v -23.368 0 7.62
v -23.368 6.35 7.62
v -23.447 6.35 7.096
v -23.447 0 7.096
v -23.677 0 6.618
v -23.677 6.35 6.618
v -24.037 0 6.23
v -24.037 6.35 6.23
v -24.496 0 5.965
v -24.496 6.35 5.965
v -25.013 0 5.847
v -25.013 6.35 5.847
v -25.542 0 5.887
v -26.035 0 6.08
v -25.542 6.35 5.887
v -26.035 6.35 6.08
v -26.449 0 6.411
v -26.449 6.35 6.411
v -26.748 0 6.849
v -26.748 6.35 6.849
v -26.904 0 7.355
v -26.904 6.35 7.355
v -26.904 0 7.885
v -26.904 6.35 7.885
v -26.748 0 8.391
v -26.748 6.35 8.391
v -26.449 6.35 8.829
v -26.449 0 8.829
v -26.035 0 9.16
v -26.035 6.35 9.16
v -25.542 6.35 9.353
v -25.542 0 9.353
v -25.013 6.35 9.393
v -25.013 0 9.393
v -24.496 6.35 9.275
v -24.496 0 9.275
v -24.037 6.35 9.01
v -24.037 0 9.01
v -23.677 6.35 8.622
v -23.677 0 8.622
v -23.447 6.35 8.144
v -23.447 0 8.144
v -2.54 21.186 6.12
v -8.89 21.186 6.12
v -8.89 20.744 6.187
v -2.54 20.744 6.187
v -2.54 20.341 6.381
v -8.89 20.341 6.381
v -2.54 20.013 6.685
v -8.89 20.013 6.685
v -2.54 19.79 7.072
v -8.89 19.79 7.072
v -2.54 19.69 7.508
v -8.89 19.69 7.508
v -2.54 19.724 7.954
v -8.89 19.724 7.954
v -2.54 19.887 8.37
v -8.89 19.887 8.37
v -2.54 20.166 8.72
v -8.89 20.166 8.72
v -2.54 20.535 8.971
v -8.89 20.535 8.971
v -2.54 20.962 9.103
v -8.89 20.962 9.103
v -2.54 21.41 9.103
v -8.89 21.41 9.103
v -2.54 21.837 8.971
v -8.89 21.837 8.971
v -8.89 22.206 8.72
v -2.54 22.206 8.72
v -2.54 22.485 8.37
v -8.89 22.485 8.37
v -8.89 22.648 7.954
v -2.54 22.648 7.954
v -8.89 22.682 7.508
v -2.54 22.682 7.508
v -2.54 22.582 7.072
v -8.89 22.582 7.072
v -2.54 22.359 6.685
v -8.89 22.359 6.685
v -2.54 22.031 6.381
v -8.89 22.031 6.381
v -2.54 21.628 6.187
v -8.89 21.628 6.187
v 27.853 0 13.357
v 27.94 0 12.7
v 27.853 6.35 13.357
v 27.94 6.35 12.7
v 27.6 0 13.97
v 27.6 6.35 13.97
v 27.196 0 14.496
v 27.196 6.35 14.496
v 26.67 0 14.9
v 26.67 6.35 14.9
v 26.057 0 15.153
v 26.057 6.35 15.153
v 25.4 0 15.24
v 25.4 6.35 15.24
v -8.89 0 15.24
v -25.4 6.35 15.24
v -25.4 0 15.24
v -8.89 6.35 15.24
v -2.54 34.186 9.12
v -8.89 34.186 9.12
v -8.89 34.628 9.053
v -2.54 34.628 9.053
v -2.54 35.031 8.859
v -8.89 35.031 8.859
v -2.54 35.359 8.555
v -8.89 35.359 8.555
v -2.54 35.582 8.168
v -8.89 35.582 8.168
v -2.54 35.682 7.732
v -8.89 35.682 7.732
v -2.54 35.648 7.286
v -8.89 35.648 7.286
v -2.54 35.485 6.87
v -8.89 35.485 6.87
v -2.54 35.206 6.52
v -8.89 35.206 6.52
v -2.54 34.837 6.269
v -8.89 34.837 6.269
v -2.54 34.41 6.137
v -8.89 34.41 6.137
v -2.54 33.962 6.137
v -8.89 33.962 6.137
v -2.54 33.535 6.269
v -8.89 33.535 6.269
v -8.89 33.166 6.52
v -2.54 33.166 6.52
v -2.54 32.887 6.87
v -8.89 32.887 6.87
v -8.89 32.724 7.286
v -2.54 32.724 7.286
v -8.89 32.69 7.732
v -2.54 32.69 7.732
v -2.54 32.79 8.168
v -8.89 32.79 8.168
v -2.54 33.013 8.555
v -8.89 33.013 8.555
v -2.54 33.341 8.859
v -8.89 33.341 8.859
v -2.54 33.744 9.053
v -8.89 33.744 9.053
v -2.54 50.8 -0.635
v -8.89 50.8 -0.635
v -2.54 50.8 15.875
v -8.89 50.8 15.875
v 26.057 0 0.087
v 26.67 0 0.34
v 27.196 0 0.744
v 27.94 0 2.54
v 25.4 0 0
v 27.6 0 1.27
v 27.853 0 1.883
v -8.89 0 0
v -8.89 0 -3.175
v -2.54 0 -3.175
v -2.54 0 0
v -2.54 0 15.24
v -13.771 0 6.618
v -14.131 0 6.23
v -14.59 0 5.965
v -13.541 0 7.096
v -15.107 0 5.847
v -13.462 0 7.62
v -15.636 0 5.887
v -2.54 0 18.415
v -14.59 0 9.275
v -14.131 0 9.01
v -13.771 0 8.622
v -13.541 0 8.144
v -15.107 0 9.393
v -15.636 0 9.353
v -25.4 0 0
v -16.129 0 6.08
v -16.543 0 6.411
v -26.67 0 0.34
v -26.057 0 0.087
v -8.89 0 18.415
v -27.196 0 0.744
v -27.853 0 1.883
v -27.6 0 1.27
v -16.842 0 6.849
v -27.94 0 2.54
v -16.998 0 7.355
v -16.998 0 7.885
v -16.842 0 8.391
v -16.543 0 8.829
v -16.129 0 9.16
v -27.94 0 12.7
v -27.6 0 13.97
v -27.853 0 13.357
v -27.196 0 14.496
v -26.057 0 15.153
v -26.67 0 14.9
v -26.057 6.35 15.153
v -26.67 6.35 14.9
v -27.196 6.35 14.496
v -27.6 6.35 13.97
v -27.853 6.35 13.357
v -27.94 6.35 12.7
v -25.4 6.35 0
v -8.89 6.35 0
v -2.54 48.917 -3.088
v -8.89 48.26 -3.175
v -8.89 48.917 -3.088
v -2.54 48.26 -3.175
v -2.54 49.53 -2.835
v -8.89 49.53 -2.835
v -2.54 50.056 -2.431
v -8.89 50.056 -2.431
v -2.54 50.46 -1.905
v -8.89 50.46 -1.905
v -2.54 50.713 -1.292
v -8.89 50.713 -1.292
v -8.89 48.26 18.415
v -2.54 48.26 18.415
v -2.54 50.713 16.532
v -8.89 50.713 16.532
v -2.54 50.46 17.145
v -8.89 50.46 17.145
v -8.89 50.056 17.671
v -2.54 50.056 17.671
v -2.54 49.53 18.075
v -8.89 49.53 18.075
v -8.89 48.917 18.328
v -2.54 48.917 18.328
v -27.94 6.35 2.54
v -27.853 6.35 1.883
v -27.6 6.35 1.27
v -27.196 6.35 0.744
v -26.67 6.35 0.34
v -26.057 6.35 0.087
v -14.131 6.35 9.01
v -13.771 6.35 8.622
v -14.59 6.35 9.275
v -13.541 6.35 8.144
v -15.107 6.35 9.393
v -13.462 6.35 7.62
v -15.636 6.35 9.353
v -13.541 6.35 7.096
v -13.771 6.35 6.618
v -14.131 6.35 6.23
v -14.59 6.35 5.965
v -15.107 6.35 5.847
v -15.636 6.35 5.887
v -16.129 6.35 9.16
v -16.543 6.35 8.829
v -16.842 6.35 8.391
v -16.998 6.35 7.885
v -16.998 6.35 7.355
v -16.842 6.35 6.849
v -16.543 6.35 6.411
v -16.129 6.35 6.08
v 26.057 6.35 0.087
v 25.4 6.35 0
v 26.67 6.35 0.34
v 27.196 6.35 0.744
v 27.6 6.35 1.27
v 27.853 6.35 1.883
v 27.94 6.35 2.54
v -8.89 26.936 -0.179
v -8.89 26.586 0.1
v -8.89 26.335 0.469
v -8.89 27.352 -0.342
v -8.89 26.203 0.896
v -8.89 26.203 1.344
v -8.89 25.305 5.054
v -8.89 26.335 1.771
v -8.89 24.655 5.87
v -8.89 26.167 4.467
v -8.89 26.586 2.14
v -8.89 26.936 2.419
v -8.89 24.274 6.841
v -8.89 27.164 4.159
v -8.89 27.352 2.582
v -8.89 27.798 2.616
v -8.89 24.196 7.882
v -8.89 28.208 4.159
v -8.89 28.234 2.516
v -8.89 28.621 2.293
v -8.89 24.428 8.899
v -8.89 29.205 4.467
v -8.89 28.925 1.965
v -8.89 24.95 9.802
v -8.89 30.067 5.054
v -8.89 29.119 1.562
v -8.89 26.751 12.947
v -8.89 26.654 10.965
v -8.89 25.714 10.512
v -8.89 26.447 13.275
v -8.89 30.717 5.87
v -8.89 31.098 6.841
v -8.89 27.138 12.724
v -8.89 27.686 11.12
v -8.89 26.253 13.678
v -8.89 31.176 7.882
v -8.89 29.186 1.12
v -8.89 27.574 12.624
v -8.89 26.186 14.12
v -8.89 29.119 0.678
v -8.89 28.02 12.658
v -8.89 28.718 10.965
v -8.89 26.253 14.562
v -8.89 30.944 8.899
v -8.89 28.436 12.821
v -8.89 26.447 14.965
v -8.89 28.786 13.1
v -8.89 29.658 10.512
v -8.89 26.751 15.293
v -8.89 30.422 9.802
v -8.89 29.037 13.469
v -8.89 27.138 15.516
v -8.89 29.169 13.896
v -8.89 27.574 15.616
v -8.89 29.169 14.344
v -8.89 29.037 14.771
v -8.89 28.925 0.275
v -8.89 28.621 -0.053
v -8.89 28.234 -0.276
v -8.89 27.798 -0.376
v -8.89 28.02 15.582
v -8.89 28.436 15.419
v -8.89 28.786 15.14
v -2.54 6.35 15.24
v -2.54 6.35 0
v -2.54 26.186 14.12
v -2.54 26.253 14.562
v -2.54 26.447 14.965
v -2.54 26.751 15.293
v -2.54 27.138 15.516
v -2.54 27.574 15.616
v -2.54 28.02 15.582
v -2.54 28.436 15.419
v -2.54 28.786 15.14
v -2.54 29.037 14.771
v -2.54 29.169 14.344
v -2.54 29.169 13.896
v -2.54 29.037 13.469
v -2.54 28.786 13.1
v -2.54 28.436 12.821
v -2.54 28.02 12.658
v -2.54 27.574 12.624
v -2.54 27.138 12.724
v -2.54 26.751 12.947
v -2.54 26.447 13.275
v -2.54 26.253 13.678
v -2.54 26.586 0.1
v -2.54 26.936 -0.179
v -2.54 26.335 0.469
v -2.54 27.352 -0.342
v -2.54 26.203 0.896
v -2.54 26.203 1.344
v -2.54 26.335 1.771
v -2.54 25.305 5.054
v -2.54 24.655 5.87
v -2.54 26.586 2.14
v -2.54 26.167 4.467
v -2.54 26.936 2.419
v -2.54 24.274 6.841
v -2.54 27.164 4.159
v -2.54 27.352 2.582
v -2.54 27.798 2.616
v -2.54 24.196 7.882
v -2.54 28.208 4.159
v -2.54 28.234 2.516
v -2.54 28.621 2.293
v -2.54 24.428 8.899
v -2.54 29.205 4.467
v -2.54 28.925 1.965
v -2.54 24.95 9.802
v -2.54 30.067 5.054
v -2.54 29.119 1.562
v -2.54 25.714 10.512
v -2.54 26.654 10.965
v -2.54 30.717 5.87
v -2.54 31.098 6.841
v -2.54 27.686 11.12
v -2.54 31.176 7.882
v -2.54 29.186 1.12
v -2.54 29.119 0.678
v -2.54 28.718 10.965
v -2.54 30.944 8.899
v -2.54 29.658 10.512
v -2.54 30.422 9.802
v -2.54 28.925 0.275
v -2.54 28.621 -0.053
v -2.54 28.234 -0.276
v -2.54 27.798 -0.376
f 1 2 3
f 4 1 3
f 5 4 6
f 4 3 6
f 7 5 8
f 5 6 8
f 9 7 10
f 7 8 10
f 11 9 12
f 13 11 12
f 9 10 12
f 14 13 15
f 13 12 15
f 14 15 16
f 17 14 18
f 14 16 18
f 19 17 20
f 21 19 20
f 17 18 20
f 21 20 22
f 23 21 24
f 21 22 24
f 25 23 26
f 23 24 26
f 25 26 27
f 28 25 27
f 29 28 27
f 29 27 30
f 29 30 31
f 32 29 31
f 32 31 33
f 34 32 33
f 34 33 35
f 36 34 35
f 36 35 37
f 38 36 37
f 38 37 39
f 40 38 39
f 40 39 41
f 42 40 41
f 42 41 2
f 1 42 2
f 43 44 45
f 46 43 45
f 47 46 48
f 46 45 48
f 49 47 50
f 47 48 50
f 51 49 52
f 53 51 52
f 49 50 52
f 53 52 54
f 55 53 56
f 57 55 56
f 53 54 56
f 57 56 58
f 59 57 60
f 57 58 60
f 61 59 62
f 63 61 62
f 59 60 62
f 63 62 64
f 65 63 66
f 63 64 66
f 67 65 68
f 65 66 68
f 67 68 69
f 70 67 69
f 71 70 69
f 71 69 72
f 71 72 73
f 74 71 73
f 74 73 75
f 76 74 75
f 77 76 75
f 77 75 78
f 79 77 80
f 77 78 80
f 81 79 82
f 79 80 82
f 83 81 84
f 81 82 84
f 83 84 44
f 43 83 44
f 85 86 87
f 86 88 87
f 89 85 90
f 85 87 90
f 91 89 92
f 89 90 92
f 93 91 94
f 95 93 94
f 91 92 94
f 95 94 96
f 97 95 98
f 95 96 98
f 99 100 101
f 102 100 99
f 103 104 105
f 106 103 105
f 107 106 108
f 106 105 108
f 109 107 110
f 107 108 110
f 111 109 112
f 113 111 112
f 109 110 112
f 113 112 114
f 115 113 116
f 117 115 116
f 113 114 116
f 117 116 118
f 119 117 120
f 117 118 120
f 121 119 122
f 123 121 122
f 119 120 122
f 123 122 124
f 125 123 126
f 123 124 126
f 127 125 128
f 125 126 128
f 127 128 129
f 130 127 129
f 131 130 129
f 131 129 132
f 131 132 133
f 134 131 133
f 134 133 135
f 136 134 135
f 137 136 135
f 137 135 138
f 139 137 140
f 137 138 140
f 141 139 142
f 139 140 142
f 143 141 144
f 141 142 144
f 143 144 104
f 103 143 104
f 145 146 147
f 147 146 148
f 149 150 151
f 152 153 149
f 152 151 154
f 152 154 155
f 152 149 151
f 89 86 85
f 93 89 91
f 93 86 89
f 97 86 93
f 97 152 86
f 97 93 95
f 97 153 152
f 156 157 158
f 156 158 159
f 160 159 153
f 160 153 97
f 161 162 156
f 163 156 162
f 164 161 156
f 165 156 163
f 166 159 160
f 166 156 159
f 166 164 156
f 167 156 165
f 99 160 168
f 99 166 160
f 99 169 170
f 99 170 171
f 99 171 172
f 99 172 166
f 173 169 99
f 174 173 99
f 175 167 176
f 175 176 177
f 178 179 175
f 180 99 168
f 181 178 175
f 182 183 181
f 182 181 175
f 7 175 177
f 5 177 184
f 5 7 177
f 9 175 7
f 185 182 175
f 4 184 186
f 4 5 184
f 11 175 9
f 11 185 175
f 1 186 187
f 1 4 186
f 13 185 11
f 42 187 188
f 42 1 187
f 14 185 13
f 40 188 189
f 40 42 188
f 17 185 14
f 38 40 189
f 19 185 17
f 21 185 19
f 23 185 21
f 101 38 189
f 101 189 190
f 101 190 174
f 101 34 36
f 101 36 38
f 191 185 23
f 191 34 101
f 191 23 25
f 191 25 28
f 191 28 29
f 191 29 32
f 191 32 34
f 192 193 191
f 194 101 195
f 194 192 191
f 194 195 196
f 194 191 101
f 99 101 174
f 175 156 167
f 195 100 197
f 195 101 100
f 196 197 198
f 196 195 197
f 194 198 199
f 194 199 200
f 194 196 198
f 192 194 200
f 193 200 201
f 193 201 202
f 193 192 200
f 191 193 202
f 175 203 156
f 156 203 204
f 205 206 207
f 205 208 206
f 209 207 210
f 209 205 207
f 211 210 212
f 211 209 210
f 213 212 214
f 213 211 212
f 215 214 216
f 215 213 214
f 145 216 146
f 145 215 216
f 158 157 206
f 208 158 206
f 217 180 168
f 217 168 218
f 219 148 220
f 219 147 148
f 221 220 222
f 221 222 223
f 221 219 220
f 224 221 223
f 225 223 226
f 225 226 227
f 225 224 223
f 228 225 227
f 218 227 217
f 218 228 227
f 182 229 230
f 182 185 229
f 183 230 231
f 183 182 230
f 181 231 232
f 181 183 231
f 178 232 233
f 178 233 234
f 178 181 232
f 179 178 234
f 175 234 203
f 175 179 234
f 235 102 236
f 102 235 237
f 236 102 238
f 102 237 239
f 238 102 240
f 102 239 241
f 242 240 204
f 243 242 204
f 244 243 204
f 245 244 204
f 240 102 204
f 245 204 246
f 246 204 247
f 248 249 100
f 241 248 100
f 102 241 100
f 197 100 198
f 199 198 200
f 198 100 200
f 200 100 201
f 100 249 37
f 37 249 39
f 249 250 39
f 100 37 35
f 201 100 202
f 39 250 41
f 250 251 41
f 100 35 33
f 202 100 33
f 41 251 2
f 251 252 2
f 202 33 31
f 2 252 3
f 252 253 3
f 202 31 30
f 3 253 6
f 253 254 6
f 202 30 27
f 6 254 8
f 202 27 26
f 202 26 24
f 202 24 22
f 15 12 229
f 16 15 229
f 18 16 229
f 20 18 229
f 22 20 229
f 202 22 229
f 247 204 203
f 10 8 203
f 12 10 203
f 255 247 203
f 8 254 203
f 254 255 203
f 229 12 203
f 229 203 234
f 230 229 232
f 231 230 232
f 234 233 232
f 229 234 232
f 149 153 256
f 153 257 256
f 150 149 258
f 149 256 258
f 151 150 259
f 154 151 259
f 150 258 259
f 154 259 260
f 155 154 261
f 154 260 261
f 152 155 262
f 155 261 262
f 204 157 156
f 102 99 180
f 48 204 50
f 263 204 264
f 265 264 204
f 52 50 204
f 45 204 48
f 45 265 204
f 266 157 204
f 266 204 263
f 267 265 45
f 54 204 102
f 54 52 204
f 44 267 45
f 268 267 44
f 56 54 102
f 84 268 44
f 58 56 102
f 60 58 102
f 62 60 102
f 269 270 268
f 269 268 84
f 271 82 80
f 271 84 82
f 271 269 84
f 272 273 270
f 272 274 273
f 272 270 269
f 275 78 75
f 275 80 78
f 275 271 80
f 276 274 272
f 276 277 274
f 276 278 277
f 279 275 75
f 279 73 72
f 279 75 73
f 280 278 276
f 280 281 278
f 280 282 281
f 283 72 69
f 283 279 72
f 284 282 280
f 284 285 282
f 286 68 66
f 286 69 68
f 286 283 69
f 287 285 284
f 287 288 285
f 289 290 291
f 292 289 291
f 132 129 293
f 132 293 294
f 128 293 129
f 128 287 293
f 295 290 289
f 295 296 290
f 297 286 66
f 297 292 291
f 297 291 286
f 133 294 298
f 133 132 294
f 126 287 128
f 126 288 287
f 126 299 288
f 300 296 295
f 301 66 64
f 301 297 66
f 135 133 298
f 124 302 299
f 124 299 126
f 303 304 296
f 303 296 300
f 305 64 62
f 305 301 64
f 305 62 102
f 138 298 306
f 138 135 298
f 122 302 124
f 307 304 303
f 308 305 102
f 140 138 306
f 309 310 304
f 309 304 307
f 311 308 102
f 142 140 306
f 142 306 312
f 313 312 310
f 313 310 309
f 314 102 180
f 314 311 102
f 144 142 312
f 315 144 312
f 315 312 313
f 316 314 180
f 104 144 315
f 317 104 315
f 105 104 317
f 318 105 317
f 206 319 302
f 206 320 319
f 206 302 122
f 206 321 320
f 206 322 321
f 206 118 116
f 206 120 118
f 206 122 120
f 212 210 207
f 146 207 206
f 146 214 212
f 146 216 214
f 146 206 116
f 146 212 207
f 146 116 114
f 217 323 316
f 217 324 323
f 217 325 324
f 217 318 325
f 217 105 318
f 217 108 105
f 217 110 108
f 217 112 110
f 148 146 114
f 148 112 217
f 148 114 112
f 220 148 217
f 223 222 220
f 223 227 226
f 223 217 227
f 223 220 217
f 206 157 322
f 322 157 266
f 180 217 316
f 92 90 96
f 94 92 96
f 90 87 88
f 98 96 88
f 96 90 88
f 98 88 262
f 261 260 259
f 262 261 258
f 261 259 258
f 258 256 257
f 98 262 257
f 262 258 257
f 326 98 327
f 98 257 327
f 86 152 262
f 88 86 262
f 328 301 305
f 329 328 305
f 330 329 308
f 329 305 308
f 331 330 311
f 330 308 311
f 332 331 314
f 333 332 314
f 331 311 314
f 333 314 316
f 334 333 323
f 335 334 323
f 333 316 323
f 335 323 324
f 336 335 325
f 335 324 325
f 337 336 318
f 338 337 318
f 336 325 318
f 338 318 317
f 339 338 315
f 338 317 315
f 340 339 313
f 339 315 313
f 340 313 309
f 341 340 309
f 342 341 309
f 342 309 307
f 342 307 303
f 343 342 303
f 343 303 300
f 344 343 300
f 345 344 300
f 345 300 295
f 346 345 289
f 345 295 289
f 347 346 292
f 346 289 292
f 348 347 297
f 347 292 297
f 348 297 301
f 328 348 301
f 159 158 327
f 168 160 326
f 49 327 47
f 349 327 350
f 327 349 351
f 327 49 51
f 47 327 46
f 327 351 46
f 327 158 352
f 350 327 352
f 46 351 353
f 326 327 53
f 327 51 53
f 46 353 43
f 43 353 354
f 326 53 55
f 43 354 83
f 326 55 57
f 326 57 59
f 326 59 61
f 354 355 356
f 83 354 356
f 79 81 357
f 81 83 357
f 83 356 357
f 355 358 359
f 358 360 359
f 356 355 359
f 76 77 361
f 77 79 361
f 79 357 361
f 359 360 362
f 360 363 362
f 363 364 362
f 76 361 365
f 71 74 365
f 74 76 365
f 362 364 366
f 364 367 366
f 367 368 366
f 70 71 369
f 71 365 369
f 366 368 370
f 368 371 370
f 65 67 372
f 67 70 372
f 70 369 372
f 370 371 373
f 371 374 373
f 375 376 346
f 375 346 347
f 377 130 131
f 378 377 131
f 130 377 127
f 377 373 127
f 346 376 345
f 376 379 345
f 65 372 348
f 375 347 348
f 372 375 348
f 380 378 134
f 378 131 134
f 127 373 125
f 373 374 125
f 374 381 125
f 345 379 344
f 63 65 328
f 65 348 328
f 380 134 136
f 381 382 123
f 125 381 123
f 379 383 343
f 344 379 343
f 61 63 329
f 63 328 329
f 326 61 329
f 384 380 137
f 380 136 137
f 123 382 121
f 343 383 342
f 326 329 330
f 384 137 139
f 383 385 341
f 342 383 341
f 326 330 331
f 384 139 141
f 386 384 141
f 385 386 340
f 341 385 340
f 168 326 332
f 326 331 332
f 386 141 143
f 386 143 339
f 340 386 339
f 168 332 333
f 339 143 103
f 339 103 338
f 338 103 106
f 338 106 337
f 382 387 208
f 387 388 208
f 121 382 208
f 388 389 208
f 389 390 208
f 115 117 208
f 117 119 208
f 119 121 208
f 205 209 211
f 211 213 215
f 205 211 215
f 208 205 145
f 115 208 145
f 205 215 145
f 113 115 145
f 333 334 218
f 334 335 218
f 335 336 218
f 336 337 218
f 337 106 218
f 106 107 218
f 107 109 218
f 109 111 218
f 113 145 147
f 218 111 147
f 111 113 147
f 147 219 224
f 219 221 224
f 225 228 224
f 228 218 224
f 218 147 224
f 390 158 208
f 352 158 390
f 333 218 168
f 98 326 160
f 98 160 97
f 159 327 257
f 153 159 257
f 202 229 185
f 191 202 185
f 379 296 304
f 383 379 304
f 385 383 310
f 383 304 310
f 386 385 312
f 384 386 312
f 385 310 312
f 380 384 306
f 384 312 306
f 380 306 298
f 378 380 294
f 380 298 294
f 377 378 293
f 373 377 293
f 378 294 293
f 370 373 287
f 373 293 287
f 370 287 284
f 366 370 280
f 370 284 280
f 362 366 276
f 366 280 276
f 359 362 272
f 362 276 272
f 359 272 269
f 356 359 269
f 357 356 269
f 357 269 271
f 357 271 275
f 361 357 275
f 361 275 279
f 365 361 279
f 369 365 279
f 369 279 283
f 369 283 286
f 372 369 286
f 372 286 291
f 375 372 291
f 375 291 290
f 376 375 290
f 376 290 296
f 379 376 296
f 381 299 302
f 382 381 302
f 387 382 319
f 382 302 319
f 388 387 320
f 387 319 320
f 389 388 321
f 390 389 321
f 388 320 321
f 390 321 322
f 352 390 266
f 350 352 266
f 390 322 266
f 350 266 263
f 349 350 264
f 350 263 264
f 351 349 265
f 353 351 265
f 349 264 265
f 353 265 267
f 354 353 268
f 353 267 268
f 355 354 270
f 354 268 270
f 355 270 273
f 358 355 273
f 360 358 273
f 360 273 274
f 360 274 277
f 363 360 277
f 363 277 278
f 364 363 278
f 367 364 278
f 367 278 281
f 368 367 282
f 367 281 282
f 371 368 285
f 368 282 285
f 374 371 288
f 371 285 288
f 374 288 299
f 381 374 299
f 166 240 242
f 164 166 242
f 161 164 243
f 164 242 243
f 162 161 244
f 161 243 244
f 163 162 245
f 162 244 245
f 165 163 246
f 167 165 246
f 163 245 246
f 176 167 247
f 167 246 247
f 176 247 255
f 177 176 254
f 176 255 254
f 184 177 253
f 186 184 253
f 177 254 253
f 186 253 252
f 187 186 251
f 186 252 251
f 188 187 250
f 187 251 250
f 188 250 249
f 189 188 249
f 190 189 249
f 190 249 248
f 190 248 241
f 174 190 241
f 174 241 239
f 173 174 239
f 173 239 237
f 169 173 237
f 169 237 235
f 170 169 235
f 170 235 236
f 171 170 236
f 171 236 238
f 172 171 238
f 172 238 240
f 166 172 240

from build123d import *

# Parameters (mm, degrees)
BOSS_EXTRUDE1_DEPTH = 15.24
SKETCH5_R           = 3.5
CUT_EXTRUDE1_DEPTH  = 15.24
SKETCH6_R           = 1.778
CUT_EXTRUDE2_DEPTH  = 15.24
SKETCH8_W           = 3.175
SKETCH8_H           = 50.8
BOSS_EXTRUDE2_DEPTH = 6.35
SKETCH7_R           = 1.5
CUT_EXTRUDE3_DEPTH  = 6.35
CIRPATTERN1_COUNT   = 4
FILLET1_R           = 2.54


with BuildPart() as part:
    # Sketch2 → Boss-Extrude1 (new body)
    with BuildSketch(Plane.XY):
        Polygon((-27.94, 0), (27.94, 0), (27.94, 6.35), (-2.54, 6.35), (-2.54, 50.8), (-8.89, 50.8), (-8.89, 6.35), (-27.94, 6.35), align=None)
    extrude(amount=BOSS_EXTRUDE1_DEPTH)

    # Sketch5 → Cut-Extrude1 (cut)
    with BuildSketch(Plane.ZY.offset(8.89)):
        with Locations((7.62, 27.686)):
            Circle(SKETCH5_R)
    extrude(amount=-CUT_EXTRUDE1_DEPTH, mode=Mode.SUBTRACT)

    # Sketch6 → Cut-Extrude2 (cut)
    with BuildSketch(Plane(origin=(0, 6.35, 0), x_dir=(1, 0, 0), z_dir=(0, 1, 0))):
        with Locations((-25.146, -7.62)):
            Circle(SKETCH6_R)
        with Locations((-15.24, -7.62)):
            Circle(SKETCH6_R)
    extrude(amount=-CUT_EXTRUDE2_DEPTH, mode=Mode.SUBTRACT)

    # Sketch8 → Boss-Extrude2 (add)
    with BuildSketch(Plane.ZY.offset(8.89)):
        with Locations((-1.5875, 25.4)):
            Rectangle(SKETCH8_W, SKETCH8_H)
        with Locations((16.8275, 25.4)):
            Rectangle(SKETCH8_W, SKETCH8_H)
    extrude(amount=-BOSS_EXTRUDE2_DEPTH)

    # Sketch7 → Cut-Extrude3 (cut)
    with BuildSketch(Plane.ZY.offset(8.89)):
        with Locations((7.62, 34.186)):
            Circle(SKETCH7_R)
    cut_extrude3 = extrude(amount=-CUT_EXTRUDE3_DEPTH, mode=Mode.SUBTRACT)

    # CirPattern1: Cut-Extrude3 ×4 about axis
    cirpattern1_axis = Axis((0, 27.686, 7.62), (1, 0, 0))
    for i in range(1, CIRPATTERN1_COUNT):
        add(cut_extrude3.rotate(cirpattern1_axis, i * 360 / CIRPATTERN1_COUNT), mode=Mode.SUBTRACT)

    # Fillet1
    fillet1_edges = [part.edges().sort_by_distance(p)[0] for p in [
        (27.94, 3.175, 0),
        (-27.94, 3.175, 0),
        (27.94, 3.175, 15.24),
        (-5.715, 50.8, -3.175),
        (-27.94, 3.175, 15.24),
        (-5.715, 50.8, 18.415),
    ]]
    fillet(fillet1_edges, radius=FILLET1_R)


solid = part.part
